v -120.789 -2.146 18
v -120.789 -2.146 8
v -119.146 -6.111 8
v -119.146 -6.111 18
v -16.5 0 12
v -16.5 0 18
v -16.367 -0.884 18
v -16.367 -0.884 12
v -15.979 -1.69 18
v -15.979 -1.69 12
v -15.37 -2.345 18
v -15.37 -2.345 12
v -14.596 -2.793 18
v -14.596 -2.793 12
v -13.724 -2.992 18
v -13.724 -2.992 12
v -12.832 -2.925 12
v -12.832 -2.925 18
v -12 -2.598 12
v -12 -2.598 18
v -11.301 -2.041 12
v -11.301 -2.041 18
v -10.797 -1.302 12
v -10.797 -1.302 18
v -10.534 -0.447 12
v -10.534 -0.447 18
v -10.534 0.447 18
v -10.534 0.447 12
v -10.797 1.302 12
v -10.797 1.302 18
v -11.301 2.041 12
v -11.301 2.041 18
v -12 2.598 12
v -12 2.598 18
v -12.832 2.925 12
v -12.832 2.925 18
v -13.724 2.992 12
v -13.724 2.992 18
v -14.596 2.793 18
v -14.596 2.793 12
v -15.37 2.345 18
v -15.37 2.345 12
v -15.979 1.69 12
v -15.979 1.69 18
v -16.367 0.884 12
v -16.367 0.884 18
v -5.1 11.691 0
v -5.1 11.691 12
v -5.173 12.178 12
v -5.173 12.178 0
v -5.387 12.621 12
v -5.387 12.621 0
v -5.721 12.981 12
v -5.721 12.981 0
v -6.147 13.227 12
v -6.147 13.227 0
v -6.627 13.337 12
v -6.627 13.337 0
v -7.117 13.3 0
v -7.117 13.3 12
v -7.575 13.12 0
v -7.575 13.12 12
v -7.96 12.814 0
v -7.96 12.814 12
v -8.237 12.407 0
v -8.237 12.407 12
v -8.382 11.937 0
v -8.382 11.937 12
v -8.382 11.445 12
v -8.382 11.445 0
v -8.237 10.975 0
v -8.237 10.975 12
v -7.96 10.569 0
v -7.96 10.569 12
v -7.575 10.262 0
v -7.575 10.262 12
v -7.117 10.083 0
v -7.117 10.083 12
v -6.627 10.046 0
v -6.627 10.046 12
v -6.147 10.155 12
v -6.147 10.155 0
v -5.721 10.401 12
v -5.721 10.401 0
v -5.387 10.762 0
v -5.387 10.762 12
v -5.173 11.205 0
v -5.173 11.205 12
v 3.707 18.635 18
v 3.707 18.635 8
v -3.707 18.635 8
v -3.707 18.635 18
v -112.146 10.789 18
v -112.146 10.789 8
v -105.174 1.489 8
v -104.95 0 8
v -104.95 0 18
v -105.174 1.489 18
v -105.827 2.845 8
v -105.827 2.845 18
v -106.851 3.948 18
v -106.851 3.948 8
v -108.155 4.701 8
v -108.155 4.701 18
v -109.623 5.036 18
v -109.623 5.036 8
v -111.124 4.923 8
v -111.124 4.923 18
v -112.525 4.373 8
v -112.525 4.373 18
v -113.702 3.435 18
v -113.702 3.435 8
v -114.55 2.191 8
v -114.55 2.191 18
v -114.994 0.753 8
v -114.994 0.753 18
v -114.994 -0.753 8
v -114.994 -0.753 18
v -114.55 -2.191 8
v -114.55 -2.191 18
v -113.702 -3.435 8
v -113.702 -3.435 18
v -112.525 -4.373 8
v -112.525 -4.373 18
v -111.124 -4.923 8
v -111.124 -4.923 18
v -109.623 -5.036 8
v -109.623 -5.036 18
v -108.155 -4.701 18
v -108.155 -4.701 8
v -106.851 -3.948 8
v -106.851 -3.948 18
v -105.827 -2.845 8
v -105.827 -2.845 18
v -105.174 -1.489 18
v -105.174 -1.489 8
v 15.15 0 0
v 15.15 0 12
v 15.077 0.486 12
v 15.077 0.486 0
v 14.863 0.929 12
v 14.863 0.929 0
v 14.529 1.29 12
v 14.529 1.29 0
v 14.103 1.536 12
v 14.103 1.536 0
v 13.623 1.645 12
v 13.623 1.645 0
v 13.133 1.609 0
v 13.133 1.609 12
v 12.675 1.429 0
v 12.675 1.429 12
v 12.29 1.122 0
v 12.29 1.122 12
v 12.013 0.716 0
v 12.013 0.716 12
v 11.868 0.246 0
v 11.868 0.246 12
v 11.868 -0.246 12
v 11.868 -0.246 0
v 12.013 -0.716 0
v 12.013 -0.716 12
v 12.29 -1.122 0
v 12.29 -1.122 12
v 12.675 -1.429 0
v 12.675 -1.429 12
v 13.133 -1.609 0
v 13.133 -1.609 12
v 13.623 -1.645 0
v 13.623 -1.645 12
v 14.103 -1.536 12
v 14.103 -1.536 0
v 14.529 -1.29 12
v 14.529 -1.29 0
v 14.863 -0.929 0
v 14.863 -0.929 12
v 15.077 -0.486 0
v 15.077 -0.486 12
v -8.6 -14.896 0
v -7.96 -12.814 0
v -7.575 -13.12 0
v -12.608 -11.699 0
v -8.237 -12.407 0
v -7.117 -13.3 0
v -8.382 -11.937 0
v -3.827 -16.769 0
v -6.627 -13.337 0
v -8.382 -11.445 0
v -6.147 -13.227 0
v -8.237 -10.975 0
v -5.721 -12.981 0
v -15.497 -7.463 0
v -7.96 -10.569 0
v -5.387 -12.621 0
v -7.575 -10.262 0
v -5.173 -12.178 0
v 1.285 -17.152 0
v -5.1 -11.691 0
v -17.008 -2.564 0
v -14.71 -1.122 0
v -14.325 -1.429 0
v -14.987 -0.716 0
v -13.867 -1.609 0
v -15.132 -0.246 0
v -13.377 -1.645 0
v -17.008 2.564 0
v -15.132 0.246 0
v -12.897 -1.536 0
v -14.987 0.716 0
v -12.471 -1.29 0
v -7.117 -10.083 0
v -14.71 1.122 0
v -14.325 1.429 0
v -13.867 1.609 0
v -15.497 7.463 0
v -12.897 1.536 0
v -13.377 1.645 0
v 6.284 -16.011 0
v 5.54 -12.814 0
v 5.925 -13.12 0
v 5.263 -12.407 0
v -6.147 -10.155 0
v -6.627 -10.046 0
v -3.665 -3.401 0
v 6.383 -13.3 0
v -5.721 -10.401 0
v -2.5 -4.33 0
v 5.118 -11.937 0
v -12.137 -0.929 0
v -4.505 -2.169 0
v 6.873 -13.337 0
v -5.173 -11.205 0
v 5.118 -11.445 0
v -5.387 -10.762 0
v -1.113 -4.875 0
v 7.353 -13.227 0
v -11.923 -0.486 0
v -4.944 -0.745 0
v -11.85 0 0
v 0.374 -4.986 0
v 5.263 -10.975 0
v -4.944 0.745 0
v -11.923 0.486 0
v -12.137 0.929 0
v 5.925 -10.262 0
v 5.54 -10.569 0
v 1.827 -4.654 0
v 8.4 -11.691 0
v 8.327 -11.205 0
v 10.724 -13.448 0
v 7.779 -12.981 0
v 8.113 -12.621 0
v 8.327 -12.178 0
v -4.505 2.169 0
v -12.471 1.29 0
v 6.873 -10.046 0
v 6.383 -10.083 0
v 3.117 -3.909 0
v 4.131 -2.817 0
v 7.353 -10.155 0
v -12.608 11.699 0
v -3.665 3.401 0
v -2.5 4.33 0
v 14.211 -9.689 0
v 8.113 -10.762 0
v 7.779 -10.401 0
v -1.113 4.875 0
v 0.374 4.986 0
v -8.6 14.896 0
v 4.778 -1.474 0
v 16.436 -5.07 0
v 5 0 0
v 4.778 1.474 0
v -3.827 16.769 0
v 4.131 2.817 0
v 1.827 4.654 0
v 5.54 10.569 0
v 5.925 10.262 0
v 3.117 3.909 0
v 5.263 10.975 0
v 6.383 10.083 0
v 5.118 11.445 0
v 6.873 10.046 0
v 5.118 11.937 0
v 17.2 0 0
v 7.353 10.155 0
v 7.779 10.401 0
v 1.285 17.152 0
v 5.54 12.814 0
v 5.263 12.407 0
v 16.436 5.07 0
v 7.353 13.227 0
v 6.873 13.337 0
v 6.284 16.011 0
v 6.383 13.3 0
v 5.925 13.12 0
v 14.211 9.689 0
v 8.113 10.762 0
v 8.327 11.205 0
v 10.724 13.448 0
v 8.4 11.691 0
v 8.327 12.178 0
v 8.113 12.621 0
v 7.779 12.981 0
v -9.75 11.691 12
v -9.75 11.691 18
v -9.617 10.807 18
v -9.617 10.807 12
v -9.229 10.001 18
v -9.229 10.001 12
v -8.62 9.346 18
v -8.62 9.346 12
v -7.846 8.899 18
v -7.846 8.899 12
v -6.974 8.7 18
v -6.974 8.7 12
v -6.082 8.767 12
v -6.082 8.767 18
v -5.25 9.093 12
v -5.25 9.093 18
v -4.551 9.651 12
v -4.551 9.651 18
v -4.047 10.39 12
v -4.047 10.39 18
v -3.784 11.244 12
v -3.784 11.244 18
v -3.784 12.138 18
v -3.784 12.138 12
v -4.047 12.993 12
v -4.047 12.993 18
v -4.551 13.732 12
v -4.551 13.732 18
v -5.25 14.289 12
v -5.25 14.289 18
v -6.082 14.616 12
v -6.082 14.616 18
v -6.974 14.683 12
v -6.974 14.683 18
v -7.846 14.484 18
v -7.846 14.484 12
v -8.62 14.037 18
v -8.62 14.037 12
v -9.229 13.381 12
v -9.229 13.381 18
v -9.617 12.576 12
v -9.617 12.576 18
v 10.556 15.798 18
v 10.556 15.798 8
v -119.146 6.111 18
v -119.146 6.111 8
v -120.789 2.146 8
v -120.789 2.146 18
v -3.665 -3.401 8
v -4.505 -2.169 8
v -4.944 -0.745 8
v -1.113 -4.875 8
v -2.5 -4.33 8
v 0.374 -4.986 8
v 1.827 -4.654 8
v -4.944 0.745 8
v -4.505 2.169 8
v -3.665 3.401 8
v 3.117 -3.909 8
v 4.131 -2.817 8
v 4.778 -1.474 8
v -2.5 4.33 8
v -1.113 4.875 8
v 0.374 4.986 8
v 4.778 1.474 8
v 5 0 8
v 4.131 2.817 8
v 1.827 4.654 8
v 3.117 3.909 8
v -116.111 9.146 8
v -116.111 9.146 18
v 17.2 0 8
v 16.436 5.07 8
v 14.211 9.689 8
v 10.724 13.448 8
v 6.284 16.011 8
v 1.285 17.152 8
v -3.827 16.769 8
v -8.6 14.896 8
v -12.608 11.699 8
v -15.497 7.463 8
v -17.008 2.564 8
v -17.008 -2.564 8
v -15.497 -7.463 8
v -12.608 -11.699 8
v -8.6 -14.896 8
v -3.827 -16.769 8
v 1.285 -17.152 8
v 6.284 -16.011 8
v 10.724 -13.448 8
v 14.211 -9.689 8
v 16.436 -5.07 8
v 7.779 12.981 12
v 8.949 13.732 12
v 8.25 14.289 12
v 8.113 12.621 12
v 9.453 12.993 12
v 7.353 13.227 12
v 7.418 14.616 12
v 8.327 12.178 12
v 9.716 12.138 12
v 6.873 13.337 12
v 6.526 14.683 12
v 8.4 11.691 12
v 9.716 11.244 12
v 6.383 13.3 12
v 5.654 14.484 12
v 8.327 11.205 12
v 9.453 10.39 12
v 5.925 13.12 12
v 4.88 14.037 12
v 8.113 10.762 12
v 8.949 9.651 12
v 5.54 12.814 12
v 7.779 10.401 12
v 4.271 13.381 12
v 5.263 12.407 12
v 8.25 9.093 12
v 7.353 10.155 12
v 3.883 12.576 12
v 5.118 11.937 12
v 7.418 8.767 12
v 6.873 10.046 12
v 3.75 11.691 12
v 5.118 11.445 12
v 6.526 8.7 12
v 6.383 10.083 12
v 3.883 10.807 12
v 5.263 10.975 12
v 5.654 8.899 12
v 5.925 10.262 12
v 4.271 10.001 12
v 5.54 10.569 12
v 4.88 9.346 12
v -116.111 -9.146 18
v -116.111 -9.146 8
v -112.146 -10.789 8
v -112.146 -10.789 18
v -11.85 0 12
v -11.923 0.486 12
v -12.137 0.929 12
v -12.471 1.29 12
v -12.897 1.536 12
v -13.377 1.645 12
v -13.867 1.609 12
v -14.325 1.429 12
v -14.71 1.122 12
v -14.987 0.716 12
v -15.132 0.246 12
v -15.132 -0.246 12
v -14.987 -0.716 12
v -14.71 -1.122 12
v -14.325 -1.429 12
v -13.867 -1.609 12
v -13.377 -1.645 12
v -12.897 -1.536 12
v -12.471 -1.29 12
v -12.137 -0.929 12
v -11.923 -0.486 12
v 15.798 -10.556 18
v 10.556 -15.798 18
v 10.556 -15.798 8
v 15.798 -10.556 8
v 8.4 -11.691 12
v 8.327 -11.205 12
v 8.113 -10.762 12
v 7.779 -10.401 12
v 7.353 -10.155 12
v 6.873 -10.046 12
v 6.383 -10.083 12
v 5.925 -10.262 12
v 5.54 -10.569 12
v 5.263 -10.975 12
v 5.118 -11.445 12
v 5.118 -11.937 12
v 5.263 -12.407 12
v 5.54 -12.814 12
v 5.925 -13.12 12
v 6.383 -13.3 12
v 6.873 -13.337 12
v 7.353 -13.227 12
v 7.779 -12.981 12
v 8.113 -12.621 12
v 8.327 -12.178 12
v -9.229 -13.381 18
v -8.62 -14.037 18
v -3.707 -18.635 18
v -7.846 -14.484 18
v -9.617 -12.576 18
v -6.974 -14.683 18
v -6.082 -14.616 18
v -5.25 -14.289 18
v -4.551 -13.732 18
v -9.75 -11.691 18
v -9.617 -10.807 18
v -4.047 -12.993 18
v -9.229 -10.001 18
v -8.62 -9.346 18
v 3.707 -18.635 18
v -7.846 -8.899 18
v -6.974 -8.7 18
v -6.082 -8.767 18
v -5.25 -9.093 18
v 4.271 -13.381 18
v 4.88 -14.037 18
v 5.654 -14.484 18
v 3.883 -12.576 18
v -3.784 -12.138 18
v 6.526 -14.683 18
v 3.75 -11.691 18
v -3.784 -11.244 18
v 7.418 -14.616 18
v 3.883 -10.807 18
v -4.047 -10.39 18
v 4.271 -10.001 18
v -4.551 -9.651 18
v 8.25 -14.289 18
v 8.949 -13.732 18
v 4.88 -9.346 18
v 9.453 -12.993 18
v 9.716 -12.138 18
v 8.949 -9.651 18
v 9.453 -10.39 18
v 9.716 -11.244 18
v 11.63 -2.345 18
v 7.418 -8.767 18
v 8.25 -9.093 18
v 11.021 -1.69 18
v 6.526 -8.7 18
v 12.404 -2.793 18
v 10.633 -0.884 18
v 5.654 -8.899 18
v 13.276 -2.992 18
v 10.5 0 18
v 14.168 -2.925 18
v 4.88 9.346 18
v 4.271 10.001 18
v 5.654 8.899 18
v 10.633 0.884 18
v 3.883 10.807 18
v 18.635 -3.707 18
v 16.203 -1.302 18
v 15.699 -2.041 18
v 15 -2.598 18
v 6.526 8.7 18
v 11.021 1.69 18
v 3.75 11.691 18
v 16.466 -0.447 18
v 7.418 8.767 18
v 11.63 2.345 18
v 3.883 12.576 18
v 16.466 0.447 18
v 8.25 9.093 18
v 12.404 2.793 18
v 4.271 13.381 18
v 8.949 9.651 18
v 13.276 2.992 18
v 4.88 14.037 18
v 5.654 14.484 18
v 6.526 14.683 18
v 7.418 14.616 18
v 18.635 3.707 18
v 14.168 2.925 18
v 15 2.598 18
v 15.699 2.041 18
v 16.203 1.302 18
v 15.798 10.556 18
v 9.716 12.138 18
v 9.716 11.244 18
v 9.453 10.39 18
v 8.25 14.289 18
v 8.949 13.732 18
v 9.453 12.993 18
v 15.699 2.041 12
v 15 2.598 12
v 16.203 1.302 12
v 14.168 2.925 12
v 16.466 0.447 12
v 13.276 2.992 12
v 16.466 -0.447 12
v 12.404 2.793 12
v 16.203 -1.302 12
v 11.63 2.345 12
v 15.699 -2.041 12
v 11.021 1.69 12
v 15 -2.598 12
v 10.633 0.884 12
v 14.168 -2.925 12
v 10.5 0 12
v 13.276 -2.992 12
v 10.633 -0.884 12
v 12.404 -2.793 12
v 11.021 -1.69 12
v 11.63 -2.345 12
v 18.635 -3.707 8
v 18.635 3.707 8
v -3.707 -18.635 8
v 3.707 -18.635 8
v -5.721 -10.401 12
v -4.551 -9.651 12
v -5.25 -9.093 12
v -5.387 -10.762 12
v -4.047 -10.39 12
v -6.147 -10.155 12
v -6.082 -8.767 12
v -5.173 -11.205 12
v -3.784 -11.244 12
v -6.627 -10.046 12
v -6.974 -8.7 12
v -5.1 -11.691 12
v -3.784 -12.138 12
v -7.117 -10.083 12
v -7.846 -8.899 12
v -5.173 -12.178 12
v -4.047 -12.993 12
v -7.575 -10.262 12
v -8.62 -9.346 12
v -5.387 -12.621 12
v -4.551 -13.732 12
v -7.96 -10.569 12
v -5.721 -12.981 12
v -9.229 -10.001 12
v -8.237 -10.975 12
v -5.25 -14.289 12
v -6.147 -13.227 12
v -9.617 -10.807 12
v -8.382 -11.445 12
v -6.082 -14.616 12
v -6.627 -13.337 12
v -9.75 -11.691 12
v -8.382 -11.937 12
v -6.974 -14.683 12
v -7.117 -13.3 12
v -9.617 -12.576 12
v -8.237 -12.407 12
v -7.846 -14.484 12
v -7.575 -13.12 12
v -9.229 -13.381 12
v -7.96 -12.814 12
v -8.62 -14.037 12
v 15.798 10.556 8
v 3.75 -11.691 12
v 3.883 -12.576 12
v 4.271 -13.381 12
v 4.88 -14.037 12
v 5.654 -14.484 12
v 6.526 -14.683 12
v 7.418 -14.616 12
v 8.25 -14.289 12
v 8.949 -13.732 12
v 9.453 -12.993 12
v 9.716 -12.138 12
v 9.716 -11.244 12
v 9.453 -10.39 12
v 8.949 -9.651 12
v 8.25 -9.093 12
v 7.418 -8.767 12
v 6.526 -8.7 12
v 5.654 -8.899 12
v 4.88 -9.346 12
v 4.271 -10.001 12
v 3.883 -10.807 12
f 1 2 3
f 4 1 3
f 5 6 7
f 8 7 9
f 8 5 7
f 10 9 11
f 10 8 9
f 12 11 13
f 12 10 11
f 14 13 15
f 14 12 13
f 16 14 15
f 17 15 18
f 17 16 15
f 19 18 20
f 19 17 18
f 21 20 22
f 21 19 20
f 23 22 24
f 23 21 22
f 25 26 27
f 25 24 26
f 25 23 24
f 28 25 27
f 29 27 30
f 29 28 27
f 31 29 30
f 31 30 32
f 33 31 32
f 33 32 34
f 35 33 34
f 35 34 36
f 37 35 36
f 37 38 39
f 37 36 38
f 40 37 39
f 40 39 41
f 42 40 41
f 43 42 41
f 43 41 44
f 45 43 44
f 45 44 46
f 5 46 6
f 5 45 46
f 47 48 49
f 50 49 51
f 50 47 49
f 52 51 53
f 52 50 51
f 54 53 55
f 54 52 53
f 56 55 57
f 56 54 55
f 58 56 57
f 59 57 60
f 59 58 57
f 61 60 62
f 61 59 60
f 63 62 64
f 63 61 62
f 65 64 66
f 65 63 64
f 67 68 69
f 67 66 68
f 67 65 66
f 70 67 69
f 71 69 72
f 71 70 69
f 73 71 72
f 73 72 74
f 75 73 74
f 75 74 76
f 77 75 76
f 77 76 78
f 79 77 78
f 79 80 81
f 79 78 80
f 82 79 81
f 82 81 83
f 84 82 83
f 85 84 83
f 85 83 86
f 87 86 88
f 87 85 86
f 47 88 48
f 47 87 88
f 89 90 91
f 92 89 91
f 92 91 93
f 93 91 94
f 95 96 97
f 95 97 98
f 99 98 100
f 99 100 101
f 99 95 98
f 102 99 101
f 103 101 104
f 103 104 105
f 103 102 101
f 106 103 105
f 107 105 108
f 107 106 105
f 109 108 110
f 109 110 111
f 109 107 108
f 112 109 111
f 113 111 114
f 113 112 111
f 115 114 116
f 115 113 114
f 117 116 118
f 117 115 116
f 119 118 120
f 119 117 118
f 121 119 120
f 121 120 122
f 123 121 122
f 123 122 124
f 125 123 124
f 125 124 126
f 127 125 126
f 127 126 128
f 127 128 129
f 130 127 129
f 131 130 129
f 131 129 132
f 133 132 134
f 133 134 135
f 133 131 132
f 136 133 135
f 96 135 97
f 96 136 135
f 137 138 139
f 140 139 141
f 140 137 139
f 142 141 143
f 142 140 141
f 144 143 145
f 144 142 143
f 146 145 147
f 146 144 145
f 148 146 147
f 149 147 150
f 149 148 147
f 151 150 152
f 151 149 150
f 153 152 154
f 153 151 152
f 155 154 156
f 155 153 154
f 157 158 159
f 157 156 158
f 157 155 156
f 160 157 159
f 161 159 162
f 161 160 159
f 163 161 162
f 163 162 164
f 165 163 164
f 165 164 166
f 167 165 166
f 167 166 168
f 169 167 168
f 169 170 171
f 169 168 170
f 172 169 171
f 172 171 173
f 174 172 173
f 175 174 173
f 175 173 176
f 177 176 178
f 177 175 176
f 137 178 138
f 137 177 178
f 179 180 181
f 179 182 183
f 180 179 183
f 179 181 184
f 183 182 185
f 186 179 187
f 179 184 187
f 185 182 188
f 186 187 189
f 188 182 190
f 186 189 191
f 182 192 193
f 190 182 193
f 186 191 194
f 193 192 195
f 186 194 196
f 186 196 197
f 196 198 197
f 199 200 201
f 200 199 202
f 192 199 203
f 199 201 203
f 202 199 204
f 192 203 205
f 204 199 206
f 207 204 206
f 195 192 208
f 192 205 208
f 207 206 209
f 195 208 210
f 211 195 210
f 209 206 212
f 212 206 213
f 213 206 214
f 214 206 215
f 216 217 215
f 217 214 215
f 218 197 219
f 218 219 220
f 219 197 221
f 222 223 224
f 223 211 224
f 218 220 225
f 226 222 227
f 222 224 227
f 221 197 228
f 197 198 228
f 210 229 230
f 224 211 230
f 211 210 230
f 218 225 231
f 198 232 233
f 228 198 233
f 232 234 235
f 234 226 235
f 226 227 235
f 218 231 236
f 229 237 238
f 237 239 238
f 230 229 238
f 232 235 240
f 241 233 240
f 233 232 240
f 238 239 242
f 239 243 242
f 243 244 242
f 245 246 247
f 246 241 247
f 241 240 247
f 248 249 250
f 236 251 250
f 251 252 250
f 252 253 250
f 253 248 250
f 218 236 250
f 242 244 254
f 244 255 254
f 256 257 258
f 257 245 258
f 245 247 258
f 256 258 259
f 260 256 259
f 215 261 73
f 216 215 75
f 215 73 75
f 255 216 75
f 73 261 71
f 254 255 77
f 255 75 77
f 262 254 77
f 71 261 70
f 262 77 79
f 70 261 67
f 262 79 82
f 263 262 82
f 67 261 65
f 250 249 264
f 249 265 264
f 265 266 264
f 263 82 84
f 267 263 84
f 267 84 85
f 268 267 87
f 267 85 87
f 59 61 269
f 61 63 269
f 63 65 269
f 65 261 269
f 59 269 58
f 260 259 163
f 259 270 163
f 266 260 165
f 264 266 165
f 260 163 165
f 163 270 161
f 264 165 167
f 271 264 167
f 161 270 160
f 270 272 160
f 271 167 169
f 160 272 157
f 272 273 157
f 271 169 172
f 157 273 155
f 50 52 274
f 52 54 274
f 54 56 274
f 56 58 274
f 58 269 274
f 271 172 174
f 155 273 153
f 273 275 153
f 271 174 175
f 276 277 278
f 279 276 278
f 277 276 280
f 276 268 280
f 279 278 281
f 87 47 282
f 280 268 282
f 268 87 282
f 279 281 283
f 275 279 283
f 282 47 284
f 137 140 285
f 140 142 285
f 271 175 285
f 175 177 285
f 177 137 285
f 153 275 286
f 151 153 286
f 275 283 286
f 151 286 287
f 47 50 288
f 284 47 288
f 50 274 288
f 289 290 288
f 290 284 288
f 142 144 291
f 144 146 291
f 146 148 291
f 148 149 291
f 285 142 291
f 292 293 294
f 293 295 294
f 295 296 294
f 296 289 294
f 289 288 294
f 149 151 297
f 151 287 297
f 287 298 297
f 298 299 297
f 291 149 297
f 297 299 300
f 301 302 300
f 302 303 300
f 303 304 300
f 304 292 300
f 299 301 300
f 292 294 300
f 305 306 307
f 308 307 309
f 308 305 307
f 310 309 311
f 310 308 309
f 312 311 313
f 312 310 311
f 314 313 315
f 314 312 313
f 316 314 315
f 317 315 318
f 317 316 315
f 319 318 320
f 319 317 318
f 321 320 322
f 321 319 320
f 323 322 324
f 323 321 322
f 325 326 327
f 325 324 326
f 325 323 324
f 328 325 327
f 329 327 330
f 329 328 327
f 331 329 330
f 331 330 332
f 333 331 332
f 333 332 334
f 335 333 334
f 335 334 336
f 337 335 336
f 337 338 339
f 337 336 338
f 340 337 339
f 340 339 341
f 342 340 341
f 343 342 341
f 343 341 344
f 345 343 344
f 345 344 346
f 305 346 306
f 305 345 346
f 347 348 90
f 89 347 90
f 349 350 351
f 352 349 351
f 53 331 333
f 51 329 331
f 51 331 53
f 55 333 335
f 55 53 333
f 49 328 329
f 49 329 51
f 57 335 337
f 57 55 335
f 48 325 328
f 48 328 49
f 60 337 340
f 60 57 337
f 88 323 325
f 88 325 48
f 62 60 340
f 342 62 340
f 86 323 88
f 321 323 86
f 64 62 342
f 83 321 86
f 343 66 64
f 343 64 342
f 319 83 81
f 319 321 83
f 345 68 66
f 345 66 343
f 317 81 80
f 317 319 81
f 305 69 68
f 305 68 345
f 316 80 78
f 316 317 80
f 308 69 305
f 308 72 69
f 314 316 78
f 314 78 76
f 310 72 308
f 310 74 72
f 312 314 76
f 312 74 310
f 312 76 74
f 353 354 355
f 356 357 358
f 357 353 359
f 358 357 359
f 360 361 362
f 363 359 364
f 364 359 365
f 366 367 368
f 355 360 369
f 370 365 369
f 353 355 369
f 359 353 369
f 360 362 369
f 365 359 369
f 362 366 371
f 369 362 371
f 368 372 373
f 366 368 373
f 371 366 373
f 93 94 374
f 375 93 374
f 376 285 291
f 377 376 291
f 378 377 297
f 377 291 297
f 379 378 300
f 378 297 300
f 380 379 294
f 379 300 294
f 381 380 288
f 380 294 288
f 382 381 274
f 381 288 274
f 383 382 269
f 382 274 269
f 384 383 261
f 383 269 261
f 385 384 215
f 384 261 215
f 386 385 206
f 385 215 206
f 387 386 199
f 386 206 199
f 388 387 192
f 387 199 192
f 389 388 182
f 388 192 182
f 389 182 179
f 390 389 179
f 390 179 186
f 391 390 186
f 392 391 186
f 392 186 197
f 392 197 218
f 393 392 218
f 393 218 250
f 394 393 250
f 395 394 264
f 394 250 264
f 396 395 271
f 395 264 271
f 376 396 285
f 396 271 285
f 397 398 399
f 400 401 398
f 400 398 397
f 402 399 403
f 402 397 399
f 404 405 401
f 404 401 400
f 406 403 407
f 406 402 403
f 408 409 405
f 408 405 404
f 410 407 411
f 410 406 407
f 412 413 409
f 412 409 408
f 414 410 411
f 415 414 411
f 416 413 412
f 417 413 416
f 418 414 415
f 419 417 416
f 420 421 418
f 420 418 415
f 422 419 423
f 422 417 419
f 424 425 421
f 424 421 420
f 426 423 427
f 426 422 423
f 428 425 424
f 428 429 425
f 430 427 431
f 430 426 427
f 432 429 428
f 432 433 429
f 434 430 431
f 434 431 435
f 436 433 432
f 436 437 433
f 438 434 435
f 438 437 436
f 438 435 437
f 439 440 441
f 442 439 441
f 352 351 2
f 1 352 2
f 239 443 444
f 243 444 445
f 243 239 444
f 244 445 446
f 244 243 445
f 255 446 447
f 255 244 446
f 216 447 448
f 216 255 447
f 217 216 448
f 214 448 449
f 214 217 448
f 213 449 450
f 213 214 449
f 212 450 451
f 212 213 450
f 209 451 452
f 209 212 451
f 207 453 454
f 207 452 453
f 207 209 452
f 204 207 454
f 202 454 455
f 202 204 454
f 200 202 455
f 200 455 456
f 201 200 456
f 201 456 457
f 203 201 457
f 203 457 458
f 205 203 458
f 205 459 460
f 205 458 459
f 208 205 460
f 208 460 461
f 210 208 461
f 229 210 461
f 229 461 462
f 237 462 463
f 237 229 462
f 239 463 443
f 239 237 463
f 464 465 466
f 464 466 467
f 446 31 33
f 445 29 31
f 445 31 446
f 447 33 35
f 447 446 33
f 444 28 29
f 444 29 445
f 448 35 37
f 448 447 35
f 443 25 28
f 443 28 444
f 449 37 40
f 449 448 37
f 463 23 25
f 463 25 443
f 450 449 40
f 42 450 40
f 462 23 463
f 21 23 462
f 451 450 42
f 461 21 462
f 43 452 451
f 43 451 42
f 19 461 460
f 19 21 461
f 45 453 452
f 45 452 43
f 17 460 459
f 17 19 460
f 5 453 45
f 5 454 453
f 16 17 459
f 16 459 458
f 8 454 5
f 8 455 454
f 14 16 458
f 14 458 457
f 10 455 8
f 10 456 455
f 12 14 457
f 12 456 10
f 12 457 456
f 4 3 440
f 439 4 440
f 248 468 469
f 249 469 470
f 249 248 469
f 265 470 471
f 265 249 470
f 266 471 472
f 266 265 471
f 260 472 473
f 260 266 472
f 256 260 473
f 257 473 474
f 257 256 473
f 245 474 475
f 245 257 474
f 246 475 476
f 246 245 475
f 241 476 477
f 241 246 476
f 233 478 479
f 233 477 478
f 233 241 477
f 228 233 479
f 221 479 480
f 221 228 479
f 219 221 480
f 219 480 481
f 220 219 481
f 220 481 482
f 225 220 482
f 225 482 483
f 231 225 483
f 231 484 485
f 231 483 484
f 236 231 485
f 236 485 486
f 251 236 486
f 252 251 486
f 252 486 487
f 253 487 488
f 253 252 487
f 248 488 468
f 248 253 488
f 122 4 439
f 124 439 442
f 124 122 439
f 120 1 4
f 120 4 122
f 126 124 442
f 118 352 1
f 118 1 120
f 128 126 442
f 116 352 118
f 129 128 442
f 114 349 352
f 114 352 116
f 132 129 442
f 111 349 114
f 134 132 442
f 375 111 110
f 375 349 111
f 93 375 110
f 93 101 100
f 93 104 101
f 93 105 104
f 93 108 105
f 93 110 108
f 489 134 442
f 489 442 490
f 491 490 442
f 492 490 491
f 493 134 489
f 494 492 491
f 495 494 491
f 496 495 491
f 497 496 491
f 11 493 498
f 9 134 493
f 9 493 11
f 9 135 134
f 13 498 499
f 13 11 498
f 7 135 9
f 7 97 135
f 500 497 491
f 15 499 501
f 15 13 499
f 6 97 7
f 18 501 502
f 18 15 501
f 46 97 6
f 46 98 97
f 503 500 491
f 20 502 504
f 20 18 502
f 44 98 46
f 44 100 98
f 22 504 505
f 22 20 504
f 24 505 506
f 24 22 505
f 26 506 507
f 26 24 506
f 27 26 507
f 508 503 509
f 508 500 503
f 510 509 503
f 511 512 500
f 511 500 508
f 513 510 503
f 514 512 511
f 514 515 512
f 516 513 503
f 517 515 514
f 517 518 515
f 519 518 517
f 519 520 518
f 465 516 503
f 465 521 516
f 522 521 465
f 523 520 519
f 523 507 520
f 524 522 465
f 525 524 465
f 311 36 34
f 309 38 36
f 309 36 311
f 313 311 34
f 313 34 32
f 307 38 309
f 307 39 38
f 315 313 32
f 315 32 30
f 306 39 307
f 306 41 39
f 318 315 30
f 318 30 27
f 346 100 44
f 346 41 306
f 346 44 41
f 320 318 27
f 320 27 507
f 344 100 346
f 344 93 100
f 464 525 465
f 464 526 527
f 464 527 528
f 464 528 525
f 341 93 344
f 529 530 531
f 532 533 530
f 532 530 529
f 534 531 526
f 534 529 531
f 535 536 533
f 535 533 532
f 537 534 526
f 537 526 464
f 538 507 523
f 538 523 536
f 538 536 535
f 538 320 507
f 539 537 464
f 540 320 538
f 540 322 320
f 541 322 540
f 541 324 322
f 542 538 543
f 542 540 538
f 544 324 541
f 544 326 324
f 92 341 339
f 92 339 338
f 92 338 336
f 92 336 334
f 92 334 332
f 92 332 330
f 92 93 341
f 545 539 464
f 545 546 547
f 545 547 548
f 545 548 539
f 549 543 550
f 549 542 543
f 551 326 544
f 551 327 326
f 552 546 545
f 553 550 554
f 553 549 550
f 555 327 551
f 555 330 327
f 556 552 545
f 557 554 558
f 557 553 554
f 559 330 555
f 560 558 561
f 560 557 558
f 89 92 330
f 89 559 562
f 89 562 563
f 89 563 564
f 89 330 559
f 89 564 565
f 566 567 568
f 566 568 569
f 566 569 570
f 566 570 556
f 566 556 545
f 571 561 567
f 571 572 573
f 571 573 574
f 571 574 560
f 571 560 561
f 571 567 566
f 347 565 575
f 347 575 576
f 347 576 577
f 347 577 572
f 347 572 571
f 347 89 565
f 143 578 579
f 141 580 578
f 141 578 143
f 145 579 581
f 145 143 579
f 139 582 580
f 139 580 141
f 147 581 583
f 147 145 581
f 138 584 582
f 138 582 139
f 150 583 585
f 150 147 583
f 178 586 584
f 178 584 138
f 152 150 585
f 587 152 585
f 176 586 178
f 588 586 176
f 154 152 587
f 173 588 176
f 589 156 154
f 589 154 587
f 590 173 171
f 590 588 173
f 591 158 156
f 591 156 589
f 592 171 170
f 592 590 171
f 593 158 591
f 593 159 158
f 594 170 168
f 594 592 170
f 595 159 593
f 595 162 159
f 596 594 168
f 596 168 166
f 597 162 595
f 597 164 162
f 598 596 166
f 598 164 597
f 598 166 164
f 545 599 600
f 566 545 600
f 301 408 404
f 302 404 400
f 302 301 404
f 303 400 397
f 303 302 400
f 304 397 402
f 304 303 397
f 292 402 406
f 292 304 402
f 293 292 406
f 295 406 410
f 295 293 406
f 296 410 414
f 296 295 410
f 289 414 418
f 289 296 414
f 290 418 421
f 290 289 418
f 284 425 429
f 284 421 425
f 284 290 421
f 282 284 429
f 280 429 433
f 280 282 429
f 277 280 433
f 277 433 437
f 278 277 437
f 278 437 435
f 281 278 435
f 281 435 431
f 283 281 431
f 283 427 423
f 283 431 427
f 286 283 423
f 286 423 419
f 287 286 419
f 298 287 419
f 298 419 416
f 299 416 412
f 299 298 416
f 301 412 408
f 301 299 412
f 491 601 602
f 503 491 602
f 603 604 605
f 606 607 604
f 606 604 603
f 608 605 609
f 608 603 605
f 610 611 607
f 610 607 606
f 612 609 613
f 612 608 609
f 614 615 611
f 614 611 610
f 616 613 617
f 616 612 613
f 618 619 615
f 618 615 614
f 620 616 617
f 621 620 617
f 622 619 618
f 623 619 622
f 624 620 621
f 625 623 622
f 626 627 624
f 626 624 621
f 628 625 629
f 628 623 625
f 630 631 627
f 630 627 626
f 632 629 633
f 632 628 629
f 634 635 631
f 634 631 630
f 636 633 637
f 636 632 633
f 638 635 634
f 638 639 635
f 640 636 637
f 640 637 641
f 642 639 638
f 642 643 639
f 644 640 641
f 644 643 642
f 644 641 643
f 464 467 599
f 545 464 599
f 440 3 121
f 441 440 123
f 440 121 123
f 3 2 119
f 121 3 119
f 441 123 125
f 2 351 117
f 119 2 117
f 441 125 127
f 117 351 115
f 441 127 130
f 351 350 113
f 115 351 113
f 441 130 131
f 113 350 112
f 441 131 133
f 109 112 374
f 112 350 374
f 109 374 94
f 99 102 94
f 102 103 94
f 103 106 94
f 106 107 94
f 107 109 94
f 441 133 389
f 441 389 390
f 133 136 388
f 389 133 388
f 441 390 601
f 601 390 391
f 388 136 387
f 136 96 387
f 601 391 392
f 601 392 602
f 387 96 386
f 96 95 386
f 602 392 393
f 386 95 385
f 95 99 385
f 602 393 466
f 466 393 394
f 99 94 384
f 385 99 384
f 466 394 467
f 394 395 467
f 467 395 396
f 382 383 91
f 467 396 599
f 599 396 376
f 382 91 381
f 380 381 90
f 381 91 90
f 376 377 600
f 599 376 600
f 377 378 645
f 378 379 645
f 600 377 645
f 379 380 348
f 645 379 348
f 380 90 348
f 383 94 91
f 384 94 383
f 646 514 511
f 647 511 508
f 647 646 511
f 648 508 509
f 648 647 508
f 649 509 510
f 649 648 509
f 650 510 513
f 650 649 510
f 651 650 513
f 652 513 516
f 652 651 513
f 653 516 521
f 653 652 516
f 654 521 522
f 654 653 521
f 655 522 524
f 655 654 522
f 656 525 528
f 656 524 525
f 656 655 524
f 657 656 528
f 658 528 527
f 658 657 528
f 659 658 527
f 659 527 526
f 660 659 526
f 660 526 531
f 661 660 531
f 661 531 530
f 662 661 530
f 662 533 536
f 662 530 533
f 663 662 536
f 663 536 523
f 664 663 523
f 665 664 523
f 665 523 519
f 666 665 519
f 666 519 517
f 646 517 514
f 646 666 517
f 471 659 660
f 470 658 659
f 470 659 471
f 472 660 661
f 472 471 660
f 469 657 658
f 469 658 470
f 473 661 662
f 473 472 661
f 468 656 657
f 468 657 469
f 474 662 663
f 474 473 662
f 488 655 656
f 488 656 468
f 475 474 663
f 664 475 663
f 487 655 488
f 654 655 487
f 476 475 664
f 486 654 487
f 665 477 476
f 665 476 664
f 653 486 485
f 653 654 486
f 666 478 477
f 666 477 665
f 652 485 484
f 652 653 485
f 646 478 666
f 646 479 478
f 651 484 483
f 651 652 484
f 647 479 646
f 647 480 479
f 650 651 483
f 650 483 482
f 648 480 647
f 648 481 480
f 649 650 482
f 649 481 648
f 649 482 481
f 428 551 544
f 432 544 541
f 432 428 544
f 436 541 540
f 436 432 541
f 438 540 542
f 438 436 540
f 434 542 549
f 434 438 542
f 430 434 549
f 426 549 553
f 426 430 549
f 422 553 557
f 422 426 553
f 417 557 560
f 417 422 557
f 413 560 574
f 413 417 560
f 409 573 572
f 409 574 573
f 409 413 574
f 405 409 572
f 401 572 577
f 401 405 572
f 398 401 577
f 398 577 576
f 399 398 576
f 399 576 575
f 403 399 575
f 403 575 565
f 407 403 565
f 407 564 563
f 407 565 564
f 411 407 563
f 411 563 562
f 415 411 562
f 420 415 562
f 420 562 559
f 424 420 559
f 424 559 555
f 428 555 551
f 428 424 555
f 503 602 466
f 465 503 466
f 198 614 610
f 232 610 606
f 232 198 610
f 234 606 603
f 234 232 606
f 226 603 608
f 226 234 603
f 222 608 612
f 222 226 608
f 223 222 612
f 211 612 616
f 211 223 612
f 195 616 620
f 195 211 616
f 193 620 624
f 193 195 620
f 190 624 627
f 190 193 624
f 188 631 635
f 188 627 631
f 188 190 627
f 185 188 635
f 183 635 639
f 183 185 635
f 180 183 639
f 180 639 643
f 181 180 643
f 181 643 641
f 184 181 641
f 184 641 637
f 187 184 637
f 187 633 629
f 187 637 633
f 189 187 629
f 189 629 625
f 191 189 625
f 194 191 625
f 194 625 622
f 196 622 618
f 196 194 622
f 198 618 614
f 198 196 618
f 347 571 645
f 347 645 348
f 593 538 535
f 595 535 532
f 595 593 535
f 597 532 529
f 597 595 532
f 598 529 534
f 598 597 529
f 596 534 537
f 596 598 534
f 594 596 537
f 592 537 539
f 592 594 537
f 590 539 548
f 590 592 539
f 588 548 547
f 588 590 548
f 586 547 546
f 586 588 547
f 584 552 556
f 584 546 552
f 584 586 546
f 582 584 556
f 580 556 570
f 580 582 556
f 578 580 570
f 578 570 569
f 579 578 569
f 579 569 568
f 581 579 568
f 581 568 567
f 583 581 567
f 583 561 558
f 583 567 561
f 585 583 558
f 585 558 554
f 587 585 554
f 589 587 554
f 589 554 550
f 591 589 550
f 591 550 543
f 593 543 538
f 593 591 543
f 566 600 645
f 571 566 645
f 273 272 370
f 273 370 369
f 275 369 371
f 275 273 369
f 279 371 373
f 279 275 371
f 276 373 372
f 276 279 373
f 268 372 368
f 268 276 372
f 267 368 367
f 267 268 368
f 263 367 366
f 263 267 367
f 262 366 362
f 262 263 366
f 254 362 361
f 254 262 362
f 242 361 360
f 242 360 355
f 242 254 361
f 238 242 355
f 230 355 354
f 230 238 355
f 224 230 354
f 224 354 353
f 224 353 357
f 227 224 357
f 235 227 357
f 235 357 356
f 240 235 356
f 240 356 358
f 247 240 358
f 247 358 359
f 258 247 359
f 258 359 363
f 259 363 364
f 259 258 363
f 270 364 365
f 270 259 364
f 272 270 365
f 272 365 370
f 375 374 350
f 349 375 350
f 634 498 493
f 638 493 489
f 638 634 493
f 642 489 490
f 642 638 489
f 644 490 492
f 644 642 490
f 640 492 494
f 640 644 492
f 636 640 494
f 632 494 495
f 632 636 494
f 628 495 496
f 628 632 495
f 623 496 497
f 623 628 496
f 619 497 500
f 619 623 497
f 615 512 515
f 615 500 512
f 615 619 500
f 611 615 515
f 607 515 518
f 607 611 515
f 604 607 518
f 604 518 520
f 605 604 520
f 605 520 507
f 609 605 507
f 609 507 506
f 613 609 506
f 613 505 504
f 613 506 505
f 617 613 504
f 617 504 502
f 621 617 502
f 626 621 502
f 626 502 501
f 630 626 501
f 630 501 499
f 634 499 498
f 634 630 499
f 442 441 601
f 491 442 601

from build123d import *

# Parameters (mm, degrees)
ARM_WEB_START               = 8
PROFILE_1_R                 = 5.05
PROFILE_1_R_2               = 1.65
ARM_WEB_DEPTH               = 10
PROFILE_2_R                 = 17.2
PROFILE_2_R_2               = 5
PROFILE_2_R_3               = 1.65
ROTOR_STANDOFF_DEPTH        = 8
ROTOR_SCREW_SPOTFACES_START = 12
PROFILE_3_R                 = 3
ROTOR_SCREW_SPOTFACES_DEPTH = 6.01


with BuildPart() as part:
    # Profile_1 → Arm_web (new body)
    with BuildSketch(Plane.XY.offset(ARM_WEB_START)):
        Polygon((-116.111272563, 9.146165735), (-119.146165735, 6.111272563), (-120.788638084, 2.145993542), (-120.788638084, -2.145993542), (-119.146165735, -6.111272563), (-116.111272563, -9.146165735), (-112.145993542, -10.788638084), (-3.706716118, -18.634920328), (3.706716118, -18.634920328), (10.555834427, -15.797922634), (15.797922634, -10.555834427), (18.634920328, -3.706716118), (18.634920328, 3.706716118), (15.797922634, 10.555834427), (10.555834427, 15.797922634), (3.706716118, 18.634920328), (-3.706716118, 18.634920328), (-112.145993542, 10.788638084), align=None)
        with Locations((-110, 0)):
            Circle(PROFILE_1_R, mode=Mode.SUBTRACT)
        with Locations((-13.5, 0)):
            Circle(PROFILE_1_R_2, mode=Mode.SUBTRACT)
        with Locations((-6.75, 11.691342951)):
            Circle(PROFILE_1_R_2, mode=Mode.SUBTRACT)
        with Locations((6.75, 11.691342951)):
            Circle(PROFILE_1_R_2, mode=Mode.SUBTRACT)
        with Locations((13.5, 0)):
            Circle(PROFILE_1_R_2, mode=Mode.SUBTRACT)
        with Locations((6.75, -11.691342951)):
            Circle(PROFILE_1_R_2, mode=Mode.SUBTRACT)
        with Locations((-6.75, -11.691342951)):
            Circle(PROFILE_1_R_2, mode=Mode.SUBTRACT)
    extrude(amount=ARM_WEB_DEPTH)

    # Profile_2 → Rotor_standoff (add)
    with BuildSketch(Plane.XY):
        Circle(PROFILE_2_R)
        Circle(PROFILE_2_R_2, mode=Mode.SUBTRACT)
        with Locations((-13.5, 0)):
            Circle(PROFILE_2_R_3, mode=Mode.SUBTRACT)
        with Locations((-6.75, 11.691342951)):
            Circle(PROFILE_2_R_3, mode=Mode.SUBTRACT)
        with Locations((6.75, 11.691342951)):
            Circle(PROFILE_2_R_3, mode=Mode.SUBTRACT)
        with Locations((13.5, 0)):
            Circle(PROFILE_2_R_3, mode=Mode.SUBTRACT)
        with Locations((6.75, -11.691342951)):
            Circle(PROFILE_2_R_3, mode=Mode.SUBTRACT)
        with Locations((-6.75, -11.691342951)):
            Circle(PROFILE_2_R_3, mode=Mode.SUBTRACT)
    extrude(amount=ROTOR_STANDOFF_DEPTH)

    # Profile_3 → Rotor_screw_spotfaces (cut)
    with BuildSketch(Plane.XY.offset(ROTOR_SCREW_SPOTFACES_START)):
        with Locations(Location((-13.5, 0, 0), (0, 0, 180))):
            Circle(PROFILE_3_R)
        with Locations(Location((-6.75, 11.691342951, 0), (0, 0, 180))):
            Circle(PROFILE_3_R)
        with Locations(Location((6.75, 11.691342951, 0), (0, 0, 180))):
            Circle(PROFILE_3_R)
        with Locations(Location((13.5, 0, 0), (0, 0, 180))):
            Circle(PROFILE_3_R)
        with Locations(Location((6.75, -11.691342951, 0), (0, 0, 180))):
            Circle(PROFILE_3_R)
        with Locations(Location((-6.75, -11.691342951, 0), (0, 0, 180))):
            Circle(PROFILE_3_R)
    extrude(amount=ROTOR_SCREW_SPOTFACES_DEPTH, mode=Mode.SUBTRACT)


solid = part.part
